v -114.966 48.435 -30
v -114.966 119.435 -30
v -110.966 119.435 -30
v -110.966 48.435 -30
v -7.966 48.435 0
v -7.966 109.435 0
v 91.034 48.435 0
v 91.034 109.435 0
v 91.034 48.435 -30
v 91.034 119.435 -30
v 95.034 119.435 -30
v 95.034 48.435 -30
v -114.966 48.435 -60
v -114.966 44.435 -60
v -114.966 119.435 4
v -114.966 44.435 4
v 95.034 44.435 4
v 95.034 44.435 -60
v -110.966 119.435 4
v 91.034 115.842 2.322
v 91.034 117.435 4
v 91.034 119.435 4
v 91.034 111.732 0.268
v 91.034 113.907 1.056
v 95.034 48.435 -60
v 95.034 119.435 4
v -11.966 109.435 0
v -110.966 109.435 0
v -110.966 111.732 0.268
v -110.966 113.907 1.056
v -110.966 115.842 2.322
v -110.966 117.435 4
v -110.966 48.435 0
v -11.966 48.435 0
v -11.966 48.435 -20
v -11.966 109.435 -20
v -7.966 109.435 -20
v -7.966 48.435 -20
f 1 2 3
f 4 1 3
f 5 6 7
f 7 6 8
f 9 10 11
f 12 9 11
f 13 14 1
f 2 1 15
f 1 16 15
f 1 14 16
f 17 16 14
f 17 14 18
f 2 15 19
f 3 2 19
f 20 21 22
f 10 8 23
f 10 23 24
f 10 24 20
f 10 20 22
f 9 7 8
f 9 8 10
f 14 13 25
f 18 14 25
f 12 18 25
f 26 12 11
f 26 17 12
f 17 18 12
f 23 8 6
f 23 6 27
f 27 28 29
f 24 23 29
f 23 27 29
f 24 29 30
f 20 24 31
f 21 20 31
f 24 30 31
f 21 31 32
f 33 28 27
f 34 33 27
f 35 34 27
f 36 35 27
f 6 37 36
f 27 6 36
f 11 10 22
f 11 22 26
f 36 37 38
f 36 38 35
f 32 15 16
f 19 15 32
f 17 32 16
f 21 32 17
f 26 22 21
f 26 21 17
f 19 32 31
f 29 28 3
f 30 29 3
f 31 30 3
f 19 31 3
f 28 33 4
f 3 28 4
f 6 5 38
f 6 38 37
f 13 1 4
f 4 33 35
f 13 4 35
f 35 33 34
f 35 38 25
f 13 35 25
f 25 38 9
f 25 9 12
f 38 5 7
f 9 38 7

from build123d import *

# Parameters (mm, degrees)
SKETCH1_W           = 210
SKETCH1_H           = 75
BOSS_EXTRUDE1_DEPTH = 4
SKETCH2_W           = 210
SKETCH2_H           = 4
BOSS_EXTRUDE2_DEPTH = 60
SKETCH3_W           = 4
SKETCH3_H           = 71
BOSS_EXTRUDE3_DEPTH = 30
FILLET1_R           = 10
SKETCH5_W           = 4
SKETCH5_H           = 61
BOSS_EXTRUDE4_DEPTH = 20


with BuildPart() as part:
    # Sketch1 → Boss-Extrude1 (new body)
    with BuildSketch(Plane.XY):
        with Locations((-9.965753425, 81.934931507)):
            Rectangle(SKETCH1_W, SKETCH1_H)
    extrude(amount=BOSS_EXTRUDE1_DEPTH)

    # Sketch2 → Boss-Extrude2 (add)
    with BuildSketch(Plane.XY):
        with Locations((-9.965753425, 46.434931507)):
            Rectangle(SKETCH2_W, SKETCH2_H)
    extrude(amount=-BOSS_EXTRUDE2_DEPTH)

    # Sketch3 → Boss-Extrude3 (add)
    with BuildSketch(Plane.XY):
        with Locations((-112.965753425, 83.934931507)):
            Rectangle(SKETCH3_W, SKETCH3_H)
        with Locations((93.034246575, 83.934931507)):
            Rectangle(SKETCH3_W, SKETCH3_H)
    extrude(amount=-BOSS_EXTRUDE3_DEPTH)

    # Fillet1
    # the kernel refuses this fillet: 10 mm, written as the material it takes off along each edge
    with BuildSketch(Plane(origin=(-110.965753425, 119.434931507, 0), x_dir=(0, 0, 1), z_dir=(1, 0, 0))) as fillet1_piece_1:
        with BuildLine():
            CenterArc((FILLET1_R, FILLET1_R), FILLET1_R, 180, 90)
            Line((0, FILLET1_R), (0, 0))
            Line((0, 0), (FILLET1_R, 0))
        make_face()
    extrude(amount=202, mode=Mode.SUBTRACT)

    # Sketch5 → Boss-Extrude4 (add)
    with BuildSketch(Plane(origin=(0, 0, 0), x_dir=(-1, 0, 0), z_dir=(0, 0, -1))):
        with Locations((9.965753425, 78.934931507)):
            Rectangle(SKETCH5_W, SKETCH5_H)
    extrude(amount=BOSS_EXTRUDE4_DEPTH)


solid = part.part
